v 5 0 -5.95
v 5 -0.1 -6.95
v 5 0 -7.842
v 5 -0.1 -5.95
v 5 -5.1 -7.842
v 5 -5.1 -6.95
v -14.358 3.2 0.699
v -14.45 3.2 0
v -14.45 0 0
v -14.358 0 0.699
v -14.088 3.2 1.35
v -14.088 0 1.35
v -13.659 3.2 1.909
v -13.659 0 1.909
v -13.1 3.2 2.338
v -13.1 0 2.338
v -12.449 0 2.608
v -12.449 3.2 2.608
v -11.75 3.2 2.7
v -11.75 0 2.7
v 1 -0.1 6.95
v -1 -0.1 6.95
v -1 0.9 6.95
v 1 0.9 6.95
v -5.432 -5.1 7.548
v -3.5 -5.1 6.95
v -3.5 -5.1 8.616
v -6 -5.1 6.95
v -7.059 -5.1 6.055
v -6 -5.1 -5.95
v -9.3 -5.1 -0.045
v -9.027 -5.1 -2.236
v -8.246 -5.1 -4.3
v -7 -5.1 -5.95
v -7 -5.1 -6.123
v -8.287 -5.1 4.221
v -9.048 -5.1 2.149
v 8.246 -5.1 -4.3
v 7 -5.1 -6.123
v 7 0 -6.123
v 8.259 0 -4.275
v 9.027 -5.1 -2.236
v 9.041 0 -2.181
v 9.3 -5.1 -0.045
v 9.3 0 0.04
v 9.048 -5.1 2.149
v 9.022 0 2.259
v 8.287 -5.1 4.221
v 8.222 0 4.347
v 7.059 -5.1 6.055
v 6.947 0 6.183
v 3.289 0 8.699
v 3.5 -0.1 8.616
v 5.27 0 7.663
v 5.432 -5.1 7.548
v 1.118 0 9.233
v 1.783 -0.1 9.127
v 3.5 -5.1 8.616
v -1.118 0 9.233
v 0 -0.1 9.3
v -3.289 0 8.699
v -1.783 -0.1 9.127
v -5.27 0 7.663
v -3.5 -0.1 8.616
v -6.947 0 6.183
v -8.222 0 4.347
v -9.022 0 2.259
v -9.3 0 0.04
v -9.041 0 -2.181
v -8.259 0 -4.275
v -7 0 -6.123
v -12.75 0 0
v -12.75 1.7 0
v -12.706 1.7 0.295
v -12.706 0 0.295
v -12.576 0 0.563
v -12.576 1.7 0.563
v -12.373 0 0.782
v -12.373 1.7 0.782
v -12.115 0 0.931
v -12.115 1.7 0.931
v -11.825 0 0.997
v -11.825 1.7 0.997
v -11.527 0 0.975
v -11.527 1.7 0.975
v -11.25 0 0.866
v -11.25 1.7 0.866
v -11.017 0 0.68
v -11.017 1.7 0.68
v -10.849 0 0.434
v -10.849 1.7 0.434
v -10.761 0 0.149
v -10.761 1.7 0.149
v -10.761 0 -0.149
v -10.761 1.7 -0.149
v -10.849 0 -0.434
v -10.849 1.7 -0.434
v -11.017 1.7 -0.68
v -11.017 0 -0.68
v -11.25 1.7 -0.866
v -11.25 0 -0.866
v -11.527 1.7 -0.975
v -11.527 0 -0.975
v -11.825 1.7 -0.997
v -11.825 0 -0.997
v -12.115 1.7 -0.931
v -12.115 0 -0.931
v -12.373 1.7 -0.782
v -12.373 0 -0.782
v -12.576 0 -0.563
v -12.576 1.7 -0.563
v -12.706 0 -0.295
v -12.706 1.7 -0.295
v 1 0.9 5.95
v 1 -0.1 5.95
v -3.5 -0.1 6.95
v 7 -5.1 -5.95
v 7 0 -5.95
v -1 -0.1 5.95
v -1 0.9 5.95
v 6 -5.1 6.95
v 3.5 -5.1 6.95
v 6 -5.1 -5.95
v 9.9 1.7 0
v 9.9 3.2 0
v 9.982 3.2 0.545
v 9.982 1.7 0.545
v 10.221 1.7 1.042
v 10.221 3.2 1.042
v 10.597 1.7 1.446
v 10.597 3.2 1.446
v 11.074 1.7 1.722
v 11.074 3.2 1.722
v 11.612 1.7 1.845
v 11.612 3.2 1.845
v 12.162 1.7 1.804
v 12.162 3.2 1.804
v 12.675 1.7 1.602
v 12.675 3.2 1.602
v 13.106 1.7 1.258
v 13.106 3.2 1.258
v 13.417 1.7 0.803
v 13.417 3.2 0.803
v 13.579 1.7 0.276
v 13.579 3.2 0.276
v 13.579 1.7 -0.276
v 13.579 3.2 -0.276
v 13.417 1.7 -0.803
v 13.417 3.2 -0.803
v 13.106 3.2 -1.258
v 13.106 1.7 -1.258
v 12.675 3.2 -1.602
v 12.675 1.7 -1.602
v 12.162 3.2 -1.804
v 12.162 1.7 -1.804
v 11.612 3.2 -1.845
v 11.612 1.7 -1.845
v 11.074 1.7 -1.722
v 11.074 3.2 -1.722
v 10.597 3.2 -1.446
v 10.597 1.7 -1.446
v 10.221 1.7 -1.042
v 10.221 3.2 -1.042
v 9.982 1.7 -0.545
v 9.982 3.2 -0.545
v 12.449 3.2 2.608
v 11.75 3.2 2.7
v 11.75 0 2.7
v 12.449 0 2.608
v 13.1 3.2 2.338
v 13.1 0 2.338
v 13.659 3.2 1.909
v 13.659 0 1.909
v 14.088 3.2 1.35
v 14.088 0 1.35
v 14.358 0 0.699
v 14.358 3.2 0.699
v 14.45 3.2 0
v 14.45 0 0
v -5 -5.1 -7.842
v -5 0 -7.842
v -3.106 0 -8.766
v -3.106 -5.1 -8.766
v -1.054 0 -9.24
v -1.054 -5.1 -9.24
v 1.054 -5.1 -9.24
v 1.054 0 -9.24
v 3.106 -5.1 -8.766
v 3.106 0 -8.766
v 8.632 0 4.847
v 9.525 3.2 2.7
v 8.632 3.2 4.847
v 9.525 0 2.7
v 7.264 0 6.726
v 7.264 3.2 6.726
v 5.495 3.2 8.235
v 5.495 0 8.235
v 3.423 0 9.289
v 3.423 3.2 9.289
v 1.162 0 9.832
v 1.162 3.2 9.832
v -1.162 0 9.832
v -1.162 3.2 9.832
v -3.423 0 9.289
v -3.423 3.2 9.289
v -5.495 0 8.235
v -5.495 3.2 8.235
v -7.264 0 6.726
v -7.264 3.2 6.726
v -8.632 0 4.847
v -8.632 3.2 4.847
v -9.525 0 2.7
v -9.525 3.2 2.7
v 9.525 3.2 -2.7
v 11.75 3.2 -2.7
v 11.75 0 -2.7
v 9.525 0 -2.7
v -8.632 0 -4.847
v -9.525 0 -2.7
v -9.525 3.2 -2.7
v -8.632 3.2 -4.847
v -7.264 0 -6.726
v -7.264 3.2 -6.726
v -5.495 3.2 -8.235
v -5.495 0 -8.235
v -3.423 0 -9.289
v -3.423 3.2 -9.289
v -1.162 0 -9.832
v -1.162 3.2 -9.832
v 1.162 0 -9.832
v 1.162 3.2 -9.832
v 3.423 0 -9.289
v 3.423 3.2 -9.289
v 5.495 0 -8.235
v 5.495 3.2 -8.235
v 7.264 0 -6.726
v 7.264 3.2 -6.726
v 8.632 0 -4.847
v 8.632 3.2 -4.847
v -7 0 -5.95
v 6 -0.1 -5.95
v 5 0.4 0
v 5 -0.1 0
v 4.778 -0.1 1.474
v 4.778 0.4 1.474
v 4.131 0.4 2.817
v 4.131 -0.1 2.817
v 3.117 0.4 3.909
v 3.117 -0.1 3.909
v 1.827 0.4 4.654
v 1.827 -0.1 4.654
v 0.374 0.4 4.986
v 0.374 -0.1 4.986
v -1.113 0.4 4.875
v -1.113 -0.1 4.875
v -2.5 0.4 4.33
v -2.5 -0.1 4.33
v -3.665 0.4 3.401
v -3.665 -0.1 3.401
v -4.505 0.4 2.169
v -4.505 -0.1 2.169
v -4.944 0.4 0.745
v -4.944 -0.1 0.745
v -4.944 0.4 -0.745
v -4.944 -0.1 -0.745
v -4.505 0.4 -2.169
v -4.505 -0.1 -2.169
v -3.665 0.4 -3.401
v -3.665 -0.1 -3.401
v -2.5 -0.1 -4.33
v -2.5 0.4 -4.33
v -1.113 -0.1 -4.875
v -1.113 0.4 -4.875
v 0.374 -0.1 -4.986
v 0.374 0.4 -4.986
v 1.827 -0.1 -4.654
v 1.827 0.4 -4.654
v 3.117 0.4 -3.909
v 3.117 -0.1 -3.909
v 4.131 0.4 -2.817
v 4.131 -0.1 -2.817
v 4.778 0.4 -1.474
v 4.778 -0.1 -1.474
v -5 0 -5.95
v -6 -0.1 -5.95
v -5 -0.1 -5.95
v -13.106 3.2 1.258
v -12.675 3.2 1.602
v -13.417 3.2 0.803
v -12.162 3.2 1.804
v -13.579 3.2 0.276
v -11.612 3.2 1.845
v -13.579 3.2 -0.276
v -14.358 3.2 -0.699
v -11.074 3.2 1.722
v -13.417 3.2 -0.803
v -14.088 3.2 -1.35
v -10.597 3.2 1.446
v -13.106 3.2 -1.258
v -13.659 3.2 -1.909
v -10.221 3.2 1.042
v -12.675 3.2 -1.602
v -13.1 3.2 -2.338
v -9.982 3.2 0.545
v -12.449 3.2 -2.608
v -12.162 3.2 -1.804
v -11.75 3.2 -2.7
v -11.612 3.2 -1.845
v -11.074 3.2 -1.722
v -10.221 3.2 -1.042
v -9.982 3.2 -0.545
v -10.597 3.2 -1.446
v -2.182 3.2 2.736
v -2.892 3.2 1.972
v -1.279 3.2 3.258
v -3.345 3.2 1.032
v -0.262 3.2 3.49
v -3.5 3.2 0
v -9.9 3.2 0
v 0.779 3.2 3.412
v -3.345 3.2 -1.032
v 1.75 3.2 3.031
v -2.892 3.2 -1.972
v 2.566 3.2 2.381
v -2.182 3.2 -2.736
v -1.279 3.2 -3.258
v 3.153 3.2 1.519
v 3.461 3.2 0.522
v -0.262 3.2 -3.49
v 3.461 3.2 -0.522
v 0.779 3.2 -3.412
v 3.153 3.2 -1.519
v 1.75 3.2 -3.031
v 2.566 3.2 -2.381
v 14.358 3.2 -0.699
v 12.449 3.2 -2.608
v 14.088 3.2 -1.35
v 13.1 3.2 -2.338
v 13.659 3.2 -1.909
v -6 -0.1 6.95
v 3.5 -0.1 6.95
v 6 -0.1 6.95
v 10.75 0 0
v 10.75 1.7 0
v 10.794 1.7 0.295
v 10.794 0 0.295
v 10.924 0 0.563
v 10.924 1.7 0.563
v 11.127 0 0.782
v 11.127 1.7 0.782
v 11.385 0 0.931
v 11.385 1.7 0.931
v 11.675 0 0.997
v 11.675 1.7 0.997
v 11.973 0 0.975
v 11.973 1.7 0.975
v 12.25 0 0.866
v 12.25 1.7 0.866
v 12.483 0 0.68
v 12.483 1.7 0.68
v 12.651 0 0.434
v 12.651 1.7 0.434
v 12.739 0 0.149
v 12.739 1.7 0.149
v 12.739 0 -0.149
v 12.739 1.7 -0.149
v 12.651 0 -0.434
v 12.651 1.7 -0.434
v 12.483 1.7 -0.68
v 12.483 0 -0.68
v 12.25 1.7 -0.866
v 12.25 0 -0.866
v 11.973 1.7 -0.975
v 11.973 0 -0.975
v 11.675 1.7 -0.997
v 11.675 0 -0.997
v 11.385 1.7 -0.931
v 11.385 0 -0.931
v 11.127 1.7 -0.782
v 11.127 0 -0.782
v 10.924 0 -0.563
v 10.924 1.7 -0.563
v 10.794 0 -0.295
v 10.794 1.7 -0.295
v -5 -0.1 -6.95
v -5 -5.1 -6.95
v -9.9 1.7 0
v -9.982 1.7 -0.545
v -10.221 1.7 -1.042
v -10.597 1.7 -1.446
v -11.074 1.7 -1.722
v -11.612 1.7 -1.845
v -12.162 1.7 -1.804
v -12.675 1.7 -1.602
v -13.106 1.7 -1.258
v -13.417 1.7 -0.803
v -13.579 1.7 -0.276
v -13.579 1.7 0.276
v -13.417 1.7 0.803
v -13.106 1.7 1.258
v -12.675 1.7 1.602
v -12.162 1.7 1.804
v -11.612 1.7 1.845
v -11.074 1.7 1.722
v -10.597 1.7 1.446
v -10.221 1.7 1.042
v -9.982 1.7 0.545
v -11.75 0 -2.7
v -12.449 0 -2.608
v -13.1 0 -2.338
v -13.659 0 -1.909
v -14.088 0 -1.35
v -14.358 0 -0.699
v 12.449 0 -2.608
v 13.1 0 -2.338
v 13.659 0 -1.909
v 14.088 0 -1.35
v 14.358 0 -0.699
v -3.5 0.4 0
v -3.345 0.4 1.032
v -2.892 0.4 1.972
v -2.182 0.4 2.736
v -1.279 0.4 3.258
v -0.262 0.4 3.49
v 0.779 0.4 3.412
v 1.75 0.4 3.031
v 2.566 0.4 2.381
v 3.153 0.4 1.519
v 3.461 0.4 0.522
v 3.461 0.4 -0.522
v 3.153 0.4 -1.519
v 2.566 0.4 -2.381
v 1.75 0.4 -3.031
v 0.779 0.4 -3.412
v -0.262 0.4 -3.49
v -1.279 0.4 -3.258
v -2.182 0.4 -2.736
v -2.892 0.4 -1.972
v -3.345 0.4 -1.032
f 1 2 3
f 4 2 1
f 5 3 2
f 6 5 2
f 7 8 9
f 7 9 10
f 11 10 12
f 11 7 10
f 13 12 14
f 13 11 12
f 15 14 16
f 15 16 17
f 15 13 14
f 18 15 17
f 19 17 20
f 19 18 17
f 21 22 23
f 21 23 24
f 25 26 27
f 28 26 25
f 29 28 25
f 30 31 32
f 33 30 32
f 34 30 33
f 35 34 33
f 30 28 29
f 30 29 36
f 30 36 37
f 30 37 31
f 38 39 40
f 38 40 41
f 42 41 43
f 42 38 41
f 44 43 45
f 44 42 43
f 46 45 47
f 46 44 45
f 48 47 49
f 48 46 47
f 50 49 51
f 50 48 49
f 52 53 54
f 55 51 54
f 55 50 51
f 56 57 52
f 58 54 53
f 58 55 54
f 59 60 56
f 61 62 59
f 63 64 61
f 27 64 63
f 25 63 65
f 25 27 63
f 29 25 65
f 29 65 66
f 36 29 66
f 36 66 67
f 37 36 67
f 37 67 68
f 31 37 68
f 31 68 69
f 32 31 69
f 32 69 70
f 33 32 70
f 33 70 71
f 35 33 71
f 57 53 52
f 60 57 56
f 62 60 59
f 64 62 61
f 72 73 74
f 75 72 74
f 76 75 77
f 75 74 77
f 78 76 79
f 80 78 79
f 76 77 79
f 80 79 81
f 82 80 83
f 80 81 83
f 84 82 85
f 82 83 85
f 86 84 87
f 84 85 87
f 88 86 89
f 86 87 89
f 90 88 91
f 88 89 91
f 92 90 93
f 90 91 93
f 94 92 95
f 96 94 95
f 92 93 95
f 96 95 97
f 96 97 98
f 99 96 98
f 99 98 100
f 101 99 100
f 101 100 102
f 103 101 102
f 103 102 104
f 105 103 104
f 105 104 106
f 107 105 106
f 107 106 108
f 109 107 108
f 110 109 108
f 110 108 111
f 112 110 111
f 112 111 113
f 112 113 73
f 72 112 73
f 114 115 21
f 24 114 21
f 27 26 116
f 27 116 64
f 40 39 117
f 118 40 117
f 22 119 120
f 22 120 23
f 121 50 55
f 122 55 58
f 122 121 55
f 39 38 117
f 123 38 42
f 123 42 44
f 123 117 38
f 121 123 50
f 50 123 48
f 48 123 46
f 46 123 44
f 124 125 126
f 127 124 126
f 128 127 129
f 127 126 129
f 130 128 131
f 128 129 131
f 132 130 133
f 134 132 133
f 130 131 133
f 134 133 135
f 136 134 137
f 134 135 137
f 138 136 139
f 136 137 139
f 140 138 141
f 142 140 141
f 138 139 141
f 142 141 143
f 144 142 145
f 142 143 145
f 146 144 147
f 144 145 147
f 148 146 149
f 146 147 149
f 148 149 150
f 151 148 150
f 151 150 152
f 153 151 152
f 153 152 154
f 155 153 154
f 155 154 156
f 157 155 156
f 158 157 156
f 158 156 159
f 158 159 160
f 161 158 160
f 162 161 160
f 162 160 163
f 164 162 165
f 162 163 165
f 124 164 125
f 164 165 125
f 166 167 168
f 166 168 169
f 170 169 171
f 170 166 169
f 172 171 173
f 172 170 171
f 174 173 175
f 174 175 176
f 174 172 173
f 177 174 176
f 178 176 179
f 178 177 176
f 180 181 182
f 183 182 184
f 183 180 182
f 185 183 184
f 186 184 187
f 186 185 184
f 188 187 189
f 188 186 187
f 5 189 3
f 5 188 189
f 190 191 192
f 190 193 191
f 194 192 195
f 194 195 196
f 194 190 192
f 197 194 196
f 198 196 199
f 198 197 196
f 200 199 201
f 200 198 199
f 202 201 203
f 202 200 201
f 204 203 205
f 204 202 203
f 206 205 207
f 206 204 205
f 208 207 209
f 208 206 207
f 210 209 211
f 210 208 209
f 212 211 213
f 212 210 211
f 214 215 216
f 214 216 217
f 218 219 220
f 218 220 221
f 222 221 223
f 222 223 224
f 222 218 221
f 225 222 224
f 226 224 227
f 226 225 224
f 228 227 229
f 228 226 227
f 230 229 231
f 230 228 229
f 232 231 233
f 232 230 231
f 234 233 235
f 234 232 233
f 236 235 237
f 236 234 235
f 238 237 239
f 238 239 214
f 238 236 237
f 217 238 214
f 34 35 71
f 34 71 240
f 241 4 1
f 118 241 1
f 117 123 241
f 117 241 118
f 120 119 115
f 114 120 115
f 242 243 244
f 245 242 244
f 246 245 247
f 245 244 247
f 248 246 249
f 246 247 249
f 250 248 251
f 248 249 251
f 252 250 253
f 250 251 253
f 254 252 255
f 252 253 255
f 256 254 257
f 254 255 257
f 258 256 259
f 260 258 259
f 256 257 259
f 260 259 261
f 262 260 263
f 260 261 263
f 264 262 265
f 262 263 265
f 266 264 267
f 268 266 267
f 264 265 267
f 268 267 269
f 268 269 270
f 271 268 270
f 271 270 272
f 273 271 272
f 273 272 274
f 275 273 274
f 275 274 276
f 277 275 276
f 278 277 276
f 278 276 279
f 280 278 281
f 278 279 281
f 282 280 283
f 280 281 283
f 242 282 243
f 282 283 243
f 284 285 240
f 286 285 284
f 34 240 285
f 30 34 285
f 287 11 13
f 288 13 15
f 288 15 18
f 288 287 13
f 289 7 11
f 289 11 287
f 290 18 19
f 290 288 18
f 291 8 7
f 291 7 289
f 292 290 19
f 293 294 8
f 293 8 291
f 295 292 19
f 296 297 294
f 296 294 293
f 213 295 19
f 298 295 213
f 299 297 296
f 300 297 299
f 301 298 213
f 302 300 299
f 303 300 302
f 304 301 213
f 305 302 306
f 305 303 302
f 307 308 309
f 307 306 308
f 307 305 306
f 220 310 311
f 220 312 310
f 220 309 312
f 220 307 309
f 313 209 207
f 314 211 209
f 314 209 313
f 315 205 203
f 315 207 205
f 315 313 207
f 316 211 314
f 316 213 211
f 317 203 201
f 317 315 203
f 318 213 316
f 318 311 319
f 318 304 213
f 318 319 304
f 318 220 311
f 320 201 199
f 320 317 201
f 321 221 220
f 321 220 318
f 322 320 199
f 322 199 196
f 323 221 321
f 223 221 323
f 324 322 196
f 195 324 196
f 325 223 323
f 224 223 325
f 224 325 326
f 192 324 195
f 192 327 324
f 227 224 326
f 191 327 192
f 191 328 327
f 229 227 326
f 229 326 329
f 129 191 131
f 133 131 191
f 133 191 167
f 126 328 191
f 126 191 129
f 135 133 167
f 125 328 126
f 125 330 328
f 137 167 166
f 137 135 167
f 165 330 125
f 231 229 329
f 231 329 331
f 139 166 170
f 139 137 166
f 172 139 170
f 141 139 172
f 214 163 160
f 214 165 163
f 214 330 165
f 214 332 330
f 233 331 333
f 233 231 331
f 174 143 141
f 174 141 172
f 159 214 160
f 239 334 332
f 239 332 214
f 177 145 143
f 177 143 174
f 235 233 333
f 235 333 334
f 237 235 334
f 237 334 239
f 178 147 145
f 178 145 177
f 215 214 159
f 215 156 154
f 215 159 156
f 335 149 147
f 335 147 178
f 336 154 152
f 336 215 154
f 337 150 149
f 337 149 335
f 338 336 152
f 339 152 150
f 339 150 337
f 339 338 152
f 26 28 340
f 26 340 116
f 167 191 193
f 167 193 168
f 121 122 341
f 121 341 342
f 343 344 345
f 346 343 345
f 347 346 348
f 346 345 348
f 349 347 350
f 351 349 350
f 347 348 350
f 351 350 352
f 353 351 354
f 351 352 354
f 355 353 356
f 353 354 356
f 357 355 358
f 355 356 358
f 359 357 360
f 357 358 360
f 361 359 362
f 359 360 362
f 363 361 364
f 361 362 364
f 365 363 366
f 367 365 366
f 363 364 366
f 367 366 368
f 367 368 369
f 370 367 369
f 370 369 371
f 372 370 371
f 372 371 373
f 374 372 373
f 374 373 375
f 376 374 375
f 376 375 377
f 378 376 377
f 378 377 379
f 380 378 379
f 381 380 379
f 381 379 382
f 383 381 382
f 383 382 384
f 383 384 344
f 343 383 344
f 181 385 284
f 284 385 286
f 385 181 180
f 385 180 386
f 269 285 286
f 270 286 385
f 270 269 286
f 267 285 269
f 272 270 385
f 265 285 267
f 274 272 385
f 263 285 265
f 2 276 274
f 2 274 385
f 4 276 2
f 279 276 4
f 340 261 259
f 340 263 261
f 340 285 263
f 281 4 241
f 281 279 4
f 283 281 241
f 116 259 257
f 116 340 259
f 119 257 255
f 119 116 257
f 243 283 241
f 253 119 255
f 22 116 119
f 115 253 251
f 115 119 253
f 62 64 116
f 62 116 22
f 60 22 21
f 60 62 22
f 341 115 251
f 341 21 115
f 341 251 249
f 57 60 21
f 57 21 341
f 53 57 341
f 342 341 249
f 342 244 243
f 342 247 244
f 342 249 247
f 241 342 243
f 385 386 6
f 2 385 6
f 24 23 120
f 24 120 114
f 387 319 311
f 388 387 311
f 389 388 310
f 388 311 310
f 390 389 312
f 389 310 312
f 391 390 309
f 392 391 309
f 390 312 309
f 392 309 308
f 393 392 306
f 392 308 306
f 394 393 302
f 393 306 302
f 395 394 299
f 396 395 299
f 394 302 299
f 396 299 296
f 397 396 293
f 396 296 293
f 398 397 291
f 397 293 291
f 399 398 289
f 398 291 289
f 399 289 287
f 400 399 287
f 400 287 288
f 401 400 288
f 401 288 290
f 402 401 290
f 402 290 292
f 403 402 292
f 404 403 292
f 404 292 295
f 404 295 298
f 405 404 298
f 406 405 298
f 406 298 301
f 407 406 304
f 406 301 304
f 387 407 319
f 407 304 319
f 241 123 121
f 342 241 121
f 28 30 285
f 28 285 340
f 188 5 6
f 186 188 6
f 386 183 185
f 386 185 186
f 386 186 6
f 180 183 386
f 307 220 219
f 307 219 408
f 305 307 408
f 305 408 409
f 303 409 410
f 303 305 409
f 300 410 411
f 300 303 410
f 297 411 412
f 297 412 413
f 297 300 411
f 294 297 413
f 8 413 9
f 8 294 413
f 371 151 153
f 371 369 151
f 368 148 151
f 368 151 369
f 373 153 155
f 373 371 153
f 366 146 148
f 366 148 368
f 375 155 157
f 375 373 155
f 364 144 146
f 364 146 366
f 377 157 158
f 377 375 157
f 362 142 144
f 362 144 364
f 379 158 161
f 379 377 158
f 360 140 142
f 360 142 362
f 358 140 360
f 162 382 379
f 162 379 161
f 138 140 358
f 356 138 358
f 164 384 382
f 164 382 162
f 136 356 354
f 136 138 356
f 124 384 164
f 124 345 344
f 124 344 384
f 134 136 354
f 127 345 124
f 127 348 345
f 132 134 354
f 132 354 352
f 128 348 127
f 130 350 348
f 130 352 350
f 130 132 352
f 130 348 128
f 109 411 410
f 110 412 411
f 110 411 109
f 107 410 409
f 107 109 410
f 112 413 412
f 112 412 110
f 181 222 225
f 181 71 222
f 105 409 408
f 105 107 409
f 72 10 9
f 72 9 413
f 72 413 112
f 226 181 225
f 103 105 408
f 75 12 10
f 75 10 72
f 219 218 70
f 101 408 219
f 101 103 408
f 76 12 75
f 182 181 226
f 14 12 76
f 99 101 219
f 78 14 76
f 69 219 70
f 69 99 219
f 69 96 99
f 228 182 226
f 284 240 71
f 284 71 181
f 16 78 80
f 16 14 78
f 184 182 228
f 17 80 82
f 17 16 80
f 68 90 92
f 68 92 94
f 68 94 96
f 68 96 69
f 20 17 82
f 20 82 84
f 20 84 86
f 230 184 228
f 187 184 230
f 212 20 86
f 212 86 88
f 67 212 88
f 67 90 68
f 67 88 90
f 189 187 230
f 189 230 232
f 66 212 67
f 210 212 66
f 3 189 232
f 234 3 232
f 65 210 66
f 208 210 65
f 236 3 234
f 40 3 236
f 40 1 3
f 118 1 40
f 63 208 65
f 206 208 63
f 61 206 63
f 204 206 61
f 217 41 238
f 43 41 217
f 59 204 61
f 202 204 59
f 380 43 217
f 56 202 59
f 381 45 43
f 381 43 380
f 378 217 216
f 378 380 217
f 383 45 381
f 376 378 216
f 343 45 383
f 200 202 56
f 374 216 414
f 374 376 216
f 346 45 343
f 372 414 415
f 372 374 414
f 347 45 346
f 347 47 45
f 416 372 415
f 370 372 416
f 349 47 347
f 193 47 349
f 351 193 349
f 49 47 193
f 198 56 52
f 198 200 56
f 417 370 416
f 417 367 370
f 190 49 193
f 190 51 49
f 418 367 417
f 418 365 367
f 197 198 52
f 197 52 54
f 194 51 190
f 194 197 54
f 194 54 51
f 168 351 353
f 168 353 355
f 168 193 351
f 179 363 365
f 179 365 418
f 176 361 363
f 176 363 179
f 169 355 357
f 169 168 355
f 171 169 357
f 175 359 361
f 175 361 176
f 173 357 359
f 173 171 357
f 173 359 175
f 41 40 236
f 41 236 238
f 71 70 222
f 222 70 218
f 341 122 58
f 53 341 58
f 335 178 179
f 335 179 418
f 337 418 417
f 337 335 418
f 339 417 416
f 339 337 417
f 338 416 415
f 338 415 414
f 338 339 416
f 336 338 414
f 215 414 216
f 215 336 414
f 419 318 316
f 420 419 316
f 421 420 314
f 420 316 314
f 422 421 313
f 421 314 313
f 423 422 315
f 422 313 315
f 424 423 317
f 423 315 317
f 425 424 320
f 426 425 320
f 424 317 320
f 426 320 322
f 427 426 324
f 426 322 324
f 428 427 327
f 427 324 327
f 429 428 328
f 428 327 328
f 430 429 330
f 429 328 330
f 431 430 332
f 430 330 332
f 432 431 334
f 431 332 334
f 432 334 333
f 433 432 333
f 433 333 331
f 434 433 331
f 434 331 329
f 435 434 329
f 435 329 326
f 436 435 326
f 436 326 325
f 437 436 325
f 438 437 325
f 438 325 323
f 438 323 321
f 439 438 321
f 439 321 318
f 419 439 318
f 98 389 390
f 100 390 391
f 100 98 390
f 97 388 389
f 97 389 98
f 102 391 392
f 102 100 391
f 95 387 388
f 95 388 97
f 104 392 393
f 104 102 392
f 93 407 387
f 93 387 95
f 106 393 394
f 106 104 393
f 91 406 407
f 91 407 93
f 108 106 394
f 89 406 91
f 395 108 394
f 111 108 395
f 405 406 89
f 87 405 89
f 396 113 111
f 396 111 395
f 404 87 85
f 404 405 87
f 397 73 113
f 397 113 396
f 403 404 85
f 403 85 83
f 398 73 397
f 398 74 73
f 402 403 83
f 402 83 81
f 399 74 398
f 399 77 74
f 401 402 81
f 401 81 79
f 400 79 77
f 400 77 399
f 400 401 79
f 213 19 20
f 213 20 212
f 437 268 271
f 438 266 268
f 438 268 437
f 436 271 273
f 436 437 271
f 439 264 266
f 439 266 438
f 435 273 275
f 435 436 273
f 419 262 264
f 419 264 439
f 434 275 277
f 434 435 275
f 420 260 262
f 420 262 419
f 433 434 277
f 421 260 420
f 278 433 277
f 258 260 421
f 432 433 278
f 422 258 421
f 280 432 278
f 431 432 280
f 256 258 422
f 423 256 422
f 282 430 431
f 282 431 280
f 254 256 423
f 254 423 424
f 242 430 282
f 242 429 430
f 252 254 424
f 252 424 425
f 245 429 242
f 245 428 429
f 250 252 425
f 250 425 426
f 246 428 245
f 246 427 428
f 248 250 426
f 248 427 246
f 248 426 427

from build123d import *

# Parameters (mm, degrees)
F2_R      = 1.85
F2_R_2    = 1
F3_DEPTH  = 3.2
F4_W      = 12
F4_H      = 13.9
F5_DEPTH  = 5
F6_D      = 7
F7_W      = 2
F7_H      = 1
F8_DEPTH  = 6
F9_W      = 7
F9_H      = 10
F10_DEPTH = 5
F11_DEPTH = 3.2
F13_DEPTH = 1.5
F14_DEPTH = 25
F15_R     = 5
F16_DEPTH = 0.5
F17_W     = 2
F17_H     = 2
F18_DEPTH = 5.1


with BuildPart() as f1:
    # F0 (on Top) → F1 (revolve)
    with BuildSketch(Plane.XY):
        Polygon((-9.3, -5.1), (0, -5.1), (0, 3.2), (-9.9, 3.2), (-9.9, 0), (-9.3, 0), align=None)
    revolve(axis=Axis((0, -0.95, 0), (0, -1, 0)))

    # F4 (on face) → F5 (cut)
    with BuildSketch(Plane.XZ.offset(5.1)):
        Rectangle(F4_W, F4_H)
    extrude(amount=-F5_DEPTH, mode=Mode.SUBTRACT)

    # F6 (through all)
    with Locations(Plane.XZ.offset(5.1)):
        with Locations((0, 0)):
            Hole(F6_D / 2)

    # F7 (on face) → F8 (cut)
    with BuildSketch(Plane.XZ.offset(5.1)):
        with Locations((0, 6.45)):
            Rectangle(F7_W, F7_H)
    extrude(amount=-F8_DEPTH, mode=Mode.SUBTRACT)

    # F9 (on face) → F10 (cut)
    with BuildSketch(Plane.XZ.offset(5.1)):
        with Locations((0, 11.95)):
            Rectangle(F9_W, F9_H)
    extrude(amount=-F10_DEPTH, mode=Mode.SUBTRACT)


with BuildPart() as f3:
    # F2 (on face) → F3 (new body)
    with BuildSketch(Plane(origin=(0, 3.2, 0), x_dir=(-1, 0, 0), z_dir=(0, 1, 0))):
        with BuildLine():
            Line((-11.75, -2.7), (-9.5247047198, -2.7))
            ThreePointArc((-9.5247047198, -2.7), (-9.8057273245, -1.3629789569), (-9.9, 0))
            ThreePointArc((-9.9, 0), (-9.8057273245, 1.3629789569), (-9.5247047198, 2.7))
            Line((-9.5247047198, 2.7), (-11.75, 2.7))
            ThreePointArc((-11.75, 2.7), (-13.6591883092, 1.9091883092), (-14.45, 0))
            ThreePointArc((-14.45, 0), (-13.6591883092, -1.9091883092), (-11.75, -2.7))
        make_face()
        with Locations((-11.75, 0)):
            Circle(F2_R, mode=Mode.SUBTRACT)
        with Locations((-11.75, 0)):
            Circle(F2_R)
        with Locations((-11.75, 0)):
            Circle(F2_R_2, mode=Mode.SUBTRACT)
    extrude(amount=-F3_DEPTH)


with BuildPart() as f11:
    # F2 (on face) → F11 (new body)
    with BuildSketch(Plane(origin=(0, 3.2, 0), x_dir=(-1, 0, 0), z_dir=(0, 1, 0))):
        with BuildLine():
            ThreePointArc((9.9, 0), (9.8057273245, -1.3629789569), (9.5247047198, -2.7))
            Line((9.5247047198, -2.7), (11.75, -2.7))
            ThreePointArc((11.75, -2.7), (13.6591883092, -1.9091883092), (14.45, 0))
            ThreePointArc((14.45, 0), (13.6591883092, 1.9091883092), (11.75, 2.7))
            Line((11.75, 2.7), (9.5247047198, 2.7))
            ThreePointArc((9.5247047198, 2.7), (9.8057273245, 1.3629789569), (9.9, 0))
        make_face()
        with BuildLine():
            ThreePointArc((13.6, 0), (11.75, -1.85), (9.9, 0))
            ThreePointArc((9.9, 0), (11.75, 1.85), (13.6, 0))
        make_face(mode=Mode.SUBTRACT)
        with BuildLine():
            ThreePointArc((13.6, 0), (11.75, 1.85), (9.9, 0))
            ThreePointArc((9.9, 0), (11.75, -1.85), (13.6, 0))
        make_face()
        with Locations((11.75, 0)):
            Circle(F2_R_2, mode=Mode.SUBTRACT)
        with Locations((11.75, 0)):
            Circle(F2_R_2)
    extrude(amount=-F11_DEPTH)


with BuildPart() as f3_1:
    add(f3.part)

    # F12: union F11, F1
    add(f11.part)
    add(f1.part)

    # F2 (on face) → F13 (cut)
    with BuildSketch(Plane(origin=(0, 3.2, 0), x_dir=(-1, 0, 0), z_dir=(0, 1, 0))):
        with BuildLine():
            ThreePointArc((13.6, 0), (11.75, 1.85), (9.9, 0))
            ThreePointArc((9.9, 0), (11.75, -1.85), (13.6, 0))
        make_face()
        with Locations((11.75, 0)):
            Circle(F2_R_2, mode=Mode.SUBTRACT)
        with Locations((-11.75, 0)):
            Circle(F2_R)
        with Locations((-11.75, 0)):
            Circle(F2_R_2, mode=Mode.SUBTRACT)
    extrude(amount=-F13_DEPTH, mode=Mode.SUBTRACT)

    # F2 (on face) → F14 (cut)
    with BuildSketch(Plane(origin=(0, 3.2, 0), x_dir=(-1, 0, 0), z_dir=(0, 1, 0))):
        with Locations((11.75, 0)):
            Circle(F2_R_2)
    extrude(amount=-F14_DEPTH, mode=Mode.SUBTRACT)

    # F15 (on face) → F16 (cut)
    with BuildSketch(Plane.XZ.offset(0.1)):
        Circle(F15_R)
    extrude(amount=-F16_DEPTH, mode=Mode.SUBTRACT)

    # F17 (on face) → F18 (cut, through all)
    with BuildSketch(Plane.XZ.offset(5.1)):
        with Locations((-6, -6.95)):
            Rectangle(F17_W, F17_H)
        with Locations((6, -6.95)):
            Rectangle(F17_W, F17_H)
    extrude(amount=-F18_DEPTH, mode=Mode.SUBTRACT)


solid = f3_1.part
